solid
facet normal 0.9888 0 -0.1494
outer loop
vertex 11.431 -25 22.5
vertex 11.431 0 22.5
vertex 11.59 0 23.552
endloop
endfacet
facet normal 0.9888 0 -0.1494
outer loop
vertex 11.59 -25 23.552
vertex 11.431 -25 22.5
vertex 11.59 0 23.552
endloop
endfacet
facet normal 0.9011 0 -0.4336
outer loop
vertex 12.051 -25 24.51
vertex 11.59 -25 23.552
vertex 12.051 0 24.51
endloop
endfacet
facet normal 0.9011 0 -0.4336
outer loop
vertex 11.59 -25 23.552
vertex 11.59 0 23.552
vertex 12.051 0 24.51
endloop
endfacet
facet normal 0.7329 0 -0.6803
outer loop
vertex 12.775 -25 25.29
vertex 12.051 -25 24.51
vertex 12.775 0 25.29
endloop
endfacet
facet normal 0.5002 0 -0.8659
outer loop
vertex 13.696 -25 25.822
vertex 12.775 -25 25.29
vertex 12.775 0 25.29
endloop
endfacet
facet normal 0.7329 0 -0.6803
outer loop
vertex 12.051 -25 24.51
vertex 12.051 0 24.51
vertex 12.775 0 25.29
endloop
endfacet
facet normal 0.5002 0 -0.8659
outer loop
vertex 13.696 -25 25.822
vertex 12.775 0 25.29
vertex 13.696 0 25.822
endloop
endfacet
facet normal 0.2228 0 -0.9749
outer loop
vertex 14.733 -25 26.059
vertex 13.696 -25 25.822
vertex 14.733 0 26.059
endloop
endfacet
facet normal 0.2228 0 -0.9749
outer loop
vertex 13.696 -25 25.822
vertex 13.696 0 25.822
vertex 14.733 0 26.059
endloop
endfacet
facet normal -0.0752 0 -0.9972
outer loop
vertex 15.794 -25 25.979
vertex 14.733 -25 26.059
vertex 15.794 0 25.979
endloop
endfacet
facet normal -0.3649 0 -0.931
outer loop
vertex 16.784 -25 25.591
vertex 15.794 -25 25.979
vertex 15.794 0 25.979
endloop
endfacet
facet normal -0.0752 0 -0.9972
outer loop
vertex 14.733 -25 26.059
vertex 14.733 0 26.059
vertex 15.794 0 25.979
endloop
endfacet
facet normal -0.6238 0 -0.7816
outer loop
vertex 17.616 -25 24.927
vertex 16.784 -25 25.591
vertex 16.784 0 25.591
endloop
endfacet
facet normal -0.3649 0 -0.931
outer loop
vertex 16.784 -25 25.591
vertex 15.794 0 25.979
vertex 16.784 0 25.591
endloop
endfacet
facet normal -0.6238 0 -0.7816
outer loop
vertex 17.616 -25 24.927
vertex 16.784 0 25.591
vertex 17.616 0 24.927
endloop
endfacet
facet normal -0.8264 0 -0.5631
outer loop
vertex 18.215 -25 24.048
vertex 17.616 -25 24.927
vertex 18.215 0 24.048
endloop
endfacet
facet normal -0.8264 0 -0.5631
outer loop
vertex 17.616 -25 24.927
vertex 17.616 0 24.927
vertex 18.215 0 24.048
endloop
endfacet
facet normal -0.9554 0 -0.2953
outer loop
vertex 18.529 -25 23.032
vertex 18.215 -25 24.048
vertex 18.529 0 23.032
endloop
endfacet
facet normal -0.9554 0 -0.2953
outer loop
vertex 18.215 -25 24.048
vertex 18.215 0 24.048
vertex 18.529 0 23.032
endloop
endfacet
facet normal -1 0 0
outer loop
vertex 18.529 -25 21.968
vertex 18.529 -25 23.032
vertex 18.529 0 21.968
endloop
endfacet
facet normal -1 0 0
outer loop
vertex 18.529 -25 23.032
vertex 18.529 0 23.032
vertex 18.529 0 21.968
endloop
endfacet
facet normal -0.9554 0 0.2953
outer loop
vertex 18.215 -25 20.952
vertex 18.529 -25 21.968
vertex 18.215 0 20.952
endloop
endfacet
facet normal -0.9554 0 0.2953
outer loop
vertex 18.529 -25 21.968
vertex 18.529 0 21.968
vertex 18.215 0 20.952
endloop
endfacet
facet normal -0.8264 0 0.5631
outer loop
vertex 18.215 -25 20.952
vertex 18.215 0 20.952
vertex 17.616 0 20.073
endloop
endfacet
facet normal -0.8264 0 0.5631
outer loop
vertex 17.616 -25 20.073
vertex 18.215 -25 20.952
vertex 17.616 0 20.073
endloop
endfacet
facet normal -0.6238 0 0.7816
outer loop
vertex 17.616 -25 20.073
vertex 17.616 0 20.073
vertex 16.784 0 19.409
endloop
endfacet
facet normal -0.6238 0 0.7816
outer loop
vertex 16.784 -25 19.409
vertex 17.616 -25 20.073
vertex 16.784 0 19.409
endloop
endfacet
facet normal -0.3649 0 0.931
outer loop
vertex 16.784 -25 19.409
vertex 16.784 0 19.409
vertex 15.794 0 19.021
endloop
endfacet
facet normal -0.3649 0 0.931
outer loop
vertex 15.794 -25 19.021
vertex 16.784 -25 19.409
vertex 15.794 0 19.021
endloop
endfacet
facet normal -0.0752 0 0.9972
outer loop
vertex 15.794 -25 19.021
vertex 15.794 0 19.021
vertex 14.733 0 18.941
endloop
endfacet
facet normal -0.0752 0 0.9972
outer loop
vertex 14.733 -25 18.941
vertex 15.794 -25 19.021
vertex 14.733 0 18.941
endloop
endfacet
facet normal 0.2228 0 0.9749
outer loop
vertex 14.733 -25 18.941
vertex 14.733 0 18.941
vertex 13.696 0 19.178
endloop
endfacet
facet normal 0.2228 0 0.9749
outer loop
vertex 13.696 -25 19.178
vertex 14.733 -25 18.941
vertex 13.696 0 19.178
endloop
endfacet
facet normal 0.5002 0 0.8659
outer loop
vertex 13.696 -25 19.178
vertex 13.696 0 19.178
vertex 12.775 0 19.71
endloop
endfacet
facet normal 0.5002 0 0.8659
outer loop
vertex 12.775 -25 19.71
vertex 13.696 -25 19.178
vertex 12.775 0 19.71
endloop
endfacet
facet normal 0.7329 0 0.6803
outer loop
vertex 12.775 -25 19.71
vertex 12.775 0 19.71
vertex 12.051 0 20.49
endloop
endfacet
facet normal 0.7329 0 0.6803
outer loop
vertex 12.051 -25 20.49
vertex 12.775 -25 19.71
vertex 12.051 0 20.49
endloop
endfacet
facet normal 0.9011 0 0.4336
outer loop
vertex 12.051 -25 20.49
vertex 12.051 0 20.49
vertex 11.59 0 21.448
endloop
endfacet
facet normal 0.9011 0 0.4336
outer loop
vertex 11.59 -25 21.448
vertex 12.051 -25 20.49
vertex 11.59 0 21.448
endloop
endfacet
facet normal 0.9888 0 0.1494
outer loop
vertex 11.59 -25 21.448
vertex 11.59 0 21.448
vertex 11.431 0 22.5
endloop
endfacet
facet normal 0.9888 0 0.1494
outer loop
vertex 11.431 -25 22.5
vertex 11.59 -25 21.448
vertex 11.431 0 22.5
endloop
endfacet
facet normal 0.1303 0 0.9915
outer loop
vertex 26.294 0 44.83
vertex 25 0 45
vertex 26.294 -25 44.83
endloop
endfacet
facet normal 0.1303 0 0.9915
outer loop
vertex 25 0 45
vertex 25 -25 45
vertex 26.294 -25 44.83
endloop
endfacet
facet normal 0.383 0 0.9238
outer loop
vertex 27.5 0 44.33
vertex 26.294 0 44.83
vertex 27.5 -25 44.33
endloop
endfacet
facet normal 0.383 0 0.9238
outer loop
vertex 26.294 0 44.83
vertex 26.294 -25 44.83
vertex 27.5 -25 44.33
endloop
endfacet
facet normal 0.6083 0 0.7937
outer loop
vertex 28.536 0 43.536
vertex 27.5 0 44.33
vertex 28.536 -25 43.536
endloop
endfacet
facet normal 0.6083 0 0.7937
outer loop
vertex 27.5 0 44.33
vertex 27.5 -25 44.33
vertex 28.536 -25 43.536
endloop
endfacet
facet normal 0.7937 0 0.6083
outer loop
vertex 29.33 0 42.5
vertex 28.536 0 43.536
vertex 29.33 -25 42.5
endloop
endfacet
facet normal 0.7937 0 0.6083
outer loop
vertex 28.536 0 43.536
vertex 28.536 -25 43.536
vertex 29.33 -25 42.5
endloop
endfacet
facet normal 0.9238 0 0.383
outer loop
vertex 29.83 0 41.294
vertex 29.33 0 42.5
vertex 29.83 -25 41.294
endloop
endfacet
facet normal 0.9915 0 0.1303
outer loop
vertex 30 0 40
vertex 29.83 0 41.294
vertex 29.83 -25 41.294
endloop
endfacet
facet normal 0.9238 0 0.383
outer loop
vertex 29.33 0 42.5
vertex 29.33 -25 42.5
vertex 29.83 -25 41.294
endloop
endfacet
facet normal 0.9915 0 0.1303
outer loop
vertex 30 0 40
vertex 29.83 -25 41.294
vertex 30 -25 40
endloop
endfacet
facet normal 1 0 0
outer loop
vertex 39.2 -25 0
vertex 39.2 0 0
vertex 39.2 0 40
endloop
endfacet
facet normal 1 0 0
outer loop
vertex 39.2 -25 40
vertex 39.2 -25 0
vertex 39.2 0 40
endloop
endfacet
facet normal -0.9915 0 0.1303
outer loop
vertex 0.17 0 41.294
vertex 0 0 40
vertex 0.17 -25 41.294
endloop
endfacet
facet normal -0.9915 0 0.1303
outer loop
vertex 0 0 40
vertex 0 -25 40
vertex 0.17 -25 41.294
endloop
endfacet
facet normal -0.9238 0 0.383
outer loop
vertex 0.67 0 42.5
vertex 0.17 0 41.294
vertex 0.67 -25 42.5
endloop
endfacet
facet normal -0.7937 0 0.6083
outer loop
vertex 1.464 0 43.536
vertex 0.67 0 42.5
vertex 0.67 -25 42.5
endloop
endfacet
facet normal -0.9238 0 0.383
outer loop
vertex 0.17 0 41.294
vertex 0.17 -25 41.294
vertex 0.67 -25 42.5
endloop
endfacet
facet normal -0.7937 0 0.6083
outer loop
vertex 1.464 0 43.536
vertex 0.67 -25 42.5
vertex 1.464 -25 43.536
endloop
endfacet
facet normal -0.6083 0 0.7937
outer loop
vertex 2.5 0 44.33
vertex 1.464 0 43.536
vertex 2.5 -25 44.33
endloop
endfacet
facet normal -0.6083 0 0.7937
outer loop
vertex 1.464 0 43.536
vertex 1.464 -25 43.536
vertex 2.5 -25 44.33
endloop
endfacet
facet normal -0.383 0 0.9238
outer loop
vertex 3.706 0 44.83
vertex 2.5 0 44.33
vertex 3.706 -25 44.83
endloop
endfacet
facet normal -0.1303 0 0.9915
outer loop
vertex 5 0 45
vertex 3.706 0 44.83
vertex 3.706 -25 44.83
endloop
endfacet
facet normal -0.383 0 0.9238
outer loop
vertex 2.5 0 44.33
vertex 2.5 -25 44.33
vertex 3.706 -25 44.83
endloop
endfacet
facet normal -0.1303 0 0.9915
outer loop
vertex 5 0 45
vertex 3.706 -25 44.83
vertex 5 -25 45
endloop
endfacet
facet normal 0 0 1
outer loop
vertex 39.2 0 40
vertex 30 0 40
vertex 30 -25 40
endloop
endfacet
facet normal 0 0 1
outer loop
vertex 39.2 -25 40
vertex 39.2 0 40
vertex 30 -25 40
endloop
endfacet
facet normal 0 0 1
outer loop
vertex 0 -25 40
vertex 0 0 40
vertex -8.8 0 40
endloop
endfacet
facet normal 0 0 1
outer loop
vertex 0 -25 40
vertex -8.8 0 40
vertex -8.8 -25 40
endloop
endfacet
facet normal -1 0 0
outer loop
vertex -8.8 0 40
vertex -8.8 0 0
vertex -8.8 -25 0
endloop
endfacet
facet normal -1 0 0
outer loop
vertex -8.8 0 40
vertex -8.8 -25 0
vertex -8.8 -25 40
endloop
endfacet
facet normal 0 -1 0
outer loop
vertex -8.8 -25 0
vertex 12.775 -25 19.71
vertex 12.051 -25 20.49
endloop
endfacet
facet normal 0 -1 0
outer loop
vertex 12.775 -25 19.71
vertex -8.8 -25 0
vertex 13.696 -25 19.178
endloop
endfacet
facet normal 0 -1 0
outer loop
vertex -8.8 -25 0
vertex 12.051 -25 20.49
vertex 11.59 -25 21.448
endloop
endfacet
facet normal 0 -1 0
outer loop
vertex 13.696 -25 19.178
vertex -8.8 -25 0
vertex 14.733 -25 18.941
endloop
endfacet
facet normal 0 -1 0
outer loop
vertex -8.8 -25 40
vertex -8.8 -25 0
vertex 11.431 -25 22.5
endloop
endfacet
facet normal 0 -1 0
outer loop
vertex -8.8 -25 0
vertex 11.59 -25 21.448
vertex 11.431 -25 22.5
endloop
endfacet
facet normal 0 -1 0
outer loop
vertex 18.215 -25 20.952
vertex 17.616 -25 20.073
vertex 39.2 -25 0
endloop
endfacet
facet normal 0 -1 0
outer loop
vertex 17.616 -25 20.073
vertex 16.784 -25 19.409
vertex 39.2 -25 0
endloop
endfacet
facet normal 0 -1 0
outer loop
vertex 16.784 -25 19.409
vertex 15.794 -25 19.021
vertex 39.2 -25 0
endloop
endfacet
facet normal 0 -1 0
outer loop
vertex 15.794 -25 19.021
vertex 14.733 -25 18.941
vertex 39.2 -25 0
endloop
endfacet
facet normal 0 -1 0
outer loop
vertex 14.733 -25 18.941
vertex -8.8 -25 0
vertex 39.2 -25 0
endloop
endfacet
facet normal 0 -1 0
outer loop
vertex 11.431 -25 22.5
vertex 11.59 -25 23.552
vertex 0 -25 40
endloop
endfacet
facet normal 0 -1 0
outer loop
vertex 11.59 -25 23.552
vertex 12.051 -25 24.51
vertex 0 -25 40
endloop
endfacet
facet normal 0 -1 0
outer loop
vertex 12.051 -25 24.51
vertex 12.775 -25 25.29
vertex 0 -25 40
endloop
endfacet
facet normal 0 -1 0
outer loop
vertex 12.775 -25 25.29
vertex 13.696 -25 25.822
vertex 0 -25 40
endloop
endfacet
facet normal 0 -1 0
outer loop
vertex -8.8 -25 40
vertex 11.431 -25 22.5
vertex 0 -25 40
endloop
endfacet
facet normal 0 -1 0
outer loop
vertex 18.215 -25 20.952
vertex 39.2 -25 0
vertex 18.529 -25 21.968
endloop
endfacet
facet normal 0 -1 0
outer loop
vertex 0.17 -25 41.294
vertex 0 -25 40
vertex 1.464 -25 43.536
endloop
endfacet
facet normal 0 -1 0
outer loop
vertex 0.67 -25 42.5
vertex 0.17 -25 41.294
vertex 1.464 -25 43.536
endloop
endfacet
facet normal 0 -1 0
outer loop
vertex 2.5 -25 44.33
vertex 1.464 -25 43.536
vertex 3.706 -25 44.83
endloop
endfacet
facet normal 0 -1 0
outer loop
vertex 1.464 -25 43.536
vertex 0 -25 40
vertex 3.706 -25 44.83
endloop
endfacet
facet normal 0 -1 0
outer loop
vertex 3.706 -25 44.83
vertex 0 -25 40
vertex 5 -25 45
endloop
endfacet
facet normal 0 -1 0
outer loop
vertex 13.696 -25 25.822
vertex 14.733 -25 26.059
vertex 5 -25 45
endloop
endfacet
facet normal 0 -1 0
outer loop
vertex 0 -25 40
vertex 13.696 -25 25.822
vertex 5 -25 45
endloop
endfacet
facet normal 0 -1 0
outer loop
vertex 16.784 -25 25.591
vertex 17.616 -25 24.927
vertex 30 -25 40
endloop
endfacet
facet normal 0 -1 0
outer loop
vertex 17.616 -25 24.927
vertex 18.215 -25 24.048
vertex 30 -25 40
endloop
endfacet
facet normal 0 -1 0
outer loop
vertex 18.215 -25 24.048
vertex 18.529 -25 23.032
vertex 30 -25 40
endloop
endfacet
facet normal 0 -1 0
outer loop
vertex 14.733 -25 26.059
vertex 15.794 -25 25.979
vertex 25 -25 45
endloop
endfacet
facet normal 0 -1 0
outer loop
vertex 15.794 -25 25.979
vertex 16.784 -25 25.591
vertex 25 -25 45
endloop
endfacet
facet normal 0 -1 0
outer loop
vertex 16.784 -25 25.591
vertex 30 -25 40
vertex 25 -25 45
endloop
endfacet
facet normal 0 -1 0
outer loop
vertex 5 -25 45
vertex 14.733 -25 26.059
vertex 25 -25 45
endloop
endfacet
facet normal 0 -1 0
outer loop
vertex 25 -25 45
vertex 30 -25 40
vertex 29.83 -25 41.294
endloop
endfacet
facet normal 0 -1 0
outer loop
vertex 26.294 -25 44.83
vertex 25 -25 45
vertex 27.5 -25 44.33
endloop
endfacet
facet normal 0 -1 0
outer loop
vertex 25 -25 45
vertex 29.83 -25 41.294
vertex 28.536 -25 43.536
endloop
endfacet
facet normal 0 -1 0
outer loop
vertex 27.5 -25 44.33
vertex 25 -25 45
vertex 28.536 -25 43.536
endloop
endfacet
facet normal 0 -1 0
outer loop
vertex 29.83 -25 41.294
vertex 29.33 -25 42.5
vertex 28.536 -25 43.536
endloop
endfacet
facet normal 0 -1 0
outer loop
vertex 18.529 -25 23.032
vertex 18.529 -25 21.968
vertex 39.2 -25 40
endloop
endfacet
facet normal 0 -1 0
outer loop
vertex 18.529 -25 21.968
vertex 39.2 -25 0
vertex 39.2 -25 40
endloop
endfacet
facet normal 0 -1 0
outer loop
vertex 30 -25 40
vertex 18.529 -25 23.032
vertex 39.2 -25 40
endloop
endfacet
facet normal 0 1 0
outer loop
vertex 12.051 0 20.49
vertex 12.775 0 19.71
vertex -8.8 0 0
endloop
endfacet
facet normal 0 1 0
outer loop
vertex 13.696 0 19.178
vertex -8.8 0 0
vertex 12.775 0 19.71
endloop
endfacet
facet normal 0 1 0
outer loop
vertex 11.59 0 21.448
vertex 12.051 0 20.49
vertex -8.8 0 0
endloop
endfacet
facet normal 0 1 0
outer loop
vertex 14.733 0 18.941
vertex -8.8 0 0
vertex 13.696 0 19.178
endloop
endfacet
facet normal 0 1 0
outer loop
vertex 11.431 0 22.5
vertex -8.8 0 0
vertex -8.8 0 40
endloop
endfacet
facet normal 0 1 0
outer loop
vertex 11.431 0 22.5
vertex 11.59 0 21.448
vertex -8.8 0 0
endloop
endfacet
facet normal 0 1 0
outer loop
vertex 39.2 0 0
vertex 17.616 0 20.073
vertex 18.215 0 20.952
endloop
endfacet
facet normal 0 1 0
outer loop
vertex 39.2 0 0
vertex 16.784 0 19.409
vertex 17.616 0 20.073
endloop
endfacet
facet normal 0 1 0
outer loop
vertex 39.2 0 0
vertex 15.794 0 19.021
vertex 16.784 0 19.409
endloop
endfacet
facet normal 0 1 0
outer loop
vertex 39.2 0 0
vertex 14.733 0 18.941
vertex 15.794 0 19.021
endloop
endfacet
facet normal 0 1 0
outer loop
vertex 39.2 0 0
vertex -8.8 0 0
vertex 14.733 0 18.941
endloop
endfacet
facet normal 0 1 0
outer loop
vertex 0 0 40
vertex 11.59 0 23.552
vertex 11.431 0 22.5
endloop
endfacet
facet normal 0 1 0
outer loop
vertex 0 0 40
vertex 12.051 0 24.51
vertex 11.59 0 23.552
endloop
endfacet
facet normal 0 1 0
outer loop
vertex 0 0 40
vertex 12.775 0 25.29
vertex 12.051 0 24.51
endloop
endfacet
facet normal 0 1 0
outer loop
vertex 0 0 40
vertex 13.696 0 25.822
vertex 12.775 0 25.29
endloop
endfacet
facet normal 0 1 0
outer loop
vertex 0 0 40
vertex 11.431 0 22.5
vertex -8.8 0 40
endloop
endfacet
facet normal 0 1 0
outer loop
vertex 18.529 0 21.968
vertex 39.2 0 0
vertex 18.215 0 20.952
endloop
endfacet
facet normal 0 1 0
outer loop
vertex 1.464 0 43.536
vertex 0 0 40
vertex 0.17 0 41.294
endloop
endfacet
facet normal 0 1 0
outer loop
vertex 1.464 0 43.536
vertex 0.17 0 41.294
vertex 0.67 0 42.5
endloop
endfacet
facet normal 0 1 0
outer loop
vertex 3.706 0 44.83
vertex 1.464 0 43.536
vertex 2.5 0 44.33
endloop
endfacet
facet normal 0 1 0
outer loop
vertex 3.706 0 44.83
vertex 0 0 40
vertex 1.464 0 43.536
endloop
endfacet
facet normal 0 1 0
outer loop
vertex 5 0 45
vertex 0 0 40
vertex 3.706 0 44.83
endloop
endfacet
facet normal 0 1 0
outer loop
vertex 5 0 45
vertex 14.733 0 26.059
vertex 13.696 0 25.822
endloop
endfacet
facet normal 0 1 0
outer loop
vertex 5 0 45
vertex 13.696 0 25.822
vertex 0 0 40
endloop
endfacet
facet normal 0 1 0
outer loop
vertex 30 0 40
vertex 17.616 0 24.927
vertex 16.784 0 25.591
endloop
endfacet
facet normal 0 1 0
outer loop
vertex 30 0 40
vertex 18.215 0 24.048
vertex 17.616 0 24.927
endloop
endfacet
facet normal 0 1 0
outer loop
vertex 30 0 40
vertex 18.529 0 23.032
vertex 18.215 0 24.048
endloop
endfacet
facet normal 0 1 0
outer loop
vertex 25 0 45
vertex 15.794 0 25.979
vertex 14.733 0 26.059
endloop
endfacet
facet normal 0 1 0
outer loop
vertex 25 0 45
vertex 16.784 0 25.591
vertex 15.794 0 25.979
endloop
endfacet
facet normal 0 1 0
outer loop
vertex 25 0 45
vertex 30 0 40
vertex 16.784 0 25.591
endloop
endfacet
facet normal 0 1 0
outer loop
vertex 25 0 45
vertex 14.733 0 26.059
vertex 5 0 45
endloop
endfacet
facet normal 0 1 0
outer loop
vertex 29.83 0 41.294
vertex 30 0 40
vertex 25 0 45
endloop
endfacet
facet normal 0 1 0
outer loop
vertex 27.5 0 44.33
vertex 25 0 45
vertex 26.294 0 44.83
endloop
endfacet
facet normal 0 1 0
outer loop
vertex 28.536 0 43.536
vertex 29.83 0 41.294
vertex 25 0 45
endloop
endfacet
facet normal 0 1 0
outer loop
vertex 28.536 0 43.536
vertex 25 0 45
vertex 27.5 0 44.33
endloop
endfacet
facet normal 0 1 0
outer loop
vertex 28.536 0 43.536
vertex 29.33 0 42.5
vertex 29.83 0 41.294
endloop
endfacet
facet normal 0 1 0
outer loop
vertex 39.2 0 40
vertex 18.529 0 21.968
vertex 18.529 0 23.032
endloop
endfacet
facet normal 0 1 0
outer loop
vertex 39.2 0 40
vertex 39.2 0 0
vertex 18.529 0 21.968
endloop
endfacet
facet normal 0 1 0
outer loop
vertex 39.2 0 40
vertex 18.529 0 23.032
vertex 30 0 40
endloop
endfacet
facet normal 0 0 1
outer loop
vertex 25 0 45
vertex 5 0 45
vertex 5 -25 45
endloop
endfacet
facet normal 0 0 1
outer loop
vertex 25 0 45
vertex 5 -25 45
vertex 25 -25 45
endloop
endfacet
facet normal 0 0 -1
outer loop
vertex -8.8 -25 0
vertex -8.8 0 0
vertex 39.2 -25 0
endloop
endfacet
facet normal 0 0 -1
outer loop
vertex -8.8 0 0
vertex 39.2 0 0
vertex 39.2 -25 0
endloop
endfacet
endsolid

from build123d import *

# Parameters (mm, degrees)
F0_W     = 30
F0_H     = 45
F1_DEPTH = 25
F3_D     = 7.1374
F4_R     = 5
F5_DEPTH = 9.2
F6_DEPTH = 8.8


with BuildPart() as f1:
    # F0 (on Front) → F1 (new body)
    with BuildSketch(Plane.XZ):
        with Locations((15, 22.5)):
            Rectangle(F0_W, F0_H)
    extrude(amount=F1_DEPTH)

    # F3 (through all)
    with Locations(Plane.XZ.offset(25)):
        with Locations((15, 22.5)):
            Hole(F3_D / 2)

    # F4
    f4_edges = [f1.edges().sort_by_distance(p)[0] for p in [
        (30, -12.5, 45),
        (0, -12.5, 45),
    ]]
    fillet(f4_edges, radius=F4_R)

    # F5 (add): a face of the model
    f5_faces = [f1.faces().sort_by_distance(p)[0] for p in [
        (30, -12.5, 20),
    ]]
    extrude(f5_faces, amount=F5_DEPTH)

    # F6 (add): a face of the model
    f6_faces = [f1.faces().sort_by_distance(p)[0] for p in [
        (0, -12.5, 20),
    ]]
    extrude(f6_faces, amount=F6_DEPTH)


solid = f1.part
